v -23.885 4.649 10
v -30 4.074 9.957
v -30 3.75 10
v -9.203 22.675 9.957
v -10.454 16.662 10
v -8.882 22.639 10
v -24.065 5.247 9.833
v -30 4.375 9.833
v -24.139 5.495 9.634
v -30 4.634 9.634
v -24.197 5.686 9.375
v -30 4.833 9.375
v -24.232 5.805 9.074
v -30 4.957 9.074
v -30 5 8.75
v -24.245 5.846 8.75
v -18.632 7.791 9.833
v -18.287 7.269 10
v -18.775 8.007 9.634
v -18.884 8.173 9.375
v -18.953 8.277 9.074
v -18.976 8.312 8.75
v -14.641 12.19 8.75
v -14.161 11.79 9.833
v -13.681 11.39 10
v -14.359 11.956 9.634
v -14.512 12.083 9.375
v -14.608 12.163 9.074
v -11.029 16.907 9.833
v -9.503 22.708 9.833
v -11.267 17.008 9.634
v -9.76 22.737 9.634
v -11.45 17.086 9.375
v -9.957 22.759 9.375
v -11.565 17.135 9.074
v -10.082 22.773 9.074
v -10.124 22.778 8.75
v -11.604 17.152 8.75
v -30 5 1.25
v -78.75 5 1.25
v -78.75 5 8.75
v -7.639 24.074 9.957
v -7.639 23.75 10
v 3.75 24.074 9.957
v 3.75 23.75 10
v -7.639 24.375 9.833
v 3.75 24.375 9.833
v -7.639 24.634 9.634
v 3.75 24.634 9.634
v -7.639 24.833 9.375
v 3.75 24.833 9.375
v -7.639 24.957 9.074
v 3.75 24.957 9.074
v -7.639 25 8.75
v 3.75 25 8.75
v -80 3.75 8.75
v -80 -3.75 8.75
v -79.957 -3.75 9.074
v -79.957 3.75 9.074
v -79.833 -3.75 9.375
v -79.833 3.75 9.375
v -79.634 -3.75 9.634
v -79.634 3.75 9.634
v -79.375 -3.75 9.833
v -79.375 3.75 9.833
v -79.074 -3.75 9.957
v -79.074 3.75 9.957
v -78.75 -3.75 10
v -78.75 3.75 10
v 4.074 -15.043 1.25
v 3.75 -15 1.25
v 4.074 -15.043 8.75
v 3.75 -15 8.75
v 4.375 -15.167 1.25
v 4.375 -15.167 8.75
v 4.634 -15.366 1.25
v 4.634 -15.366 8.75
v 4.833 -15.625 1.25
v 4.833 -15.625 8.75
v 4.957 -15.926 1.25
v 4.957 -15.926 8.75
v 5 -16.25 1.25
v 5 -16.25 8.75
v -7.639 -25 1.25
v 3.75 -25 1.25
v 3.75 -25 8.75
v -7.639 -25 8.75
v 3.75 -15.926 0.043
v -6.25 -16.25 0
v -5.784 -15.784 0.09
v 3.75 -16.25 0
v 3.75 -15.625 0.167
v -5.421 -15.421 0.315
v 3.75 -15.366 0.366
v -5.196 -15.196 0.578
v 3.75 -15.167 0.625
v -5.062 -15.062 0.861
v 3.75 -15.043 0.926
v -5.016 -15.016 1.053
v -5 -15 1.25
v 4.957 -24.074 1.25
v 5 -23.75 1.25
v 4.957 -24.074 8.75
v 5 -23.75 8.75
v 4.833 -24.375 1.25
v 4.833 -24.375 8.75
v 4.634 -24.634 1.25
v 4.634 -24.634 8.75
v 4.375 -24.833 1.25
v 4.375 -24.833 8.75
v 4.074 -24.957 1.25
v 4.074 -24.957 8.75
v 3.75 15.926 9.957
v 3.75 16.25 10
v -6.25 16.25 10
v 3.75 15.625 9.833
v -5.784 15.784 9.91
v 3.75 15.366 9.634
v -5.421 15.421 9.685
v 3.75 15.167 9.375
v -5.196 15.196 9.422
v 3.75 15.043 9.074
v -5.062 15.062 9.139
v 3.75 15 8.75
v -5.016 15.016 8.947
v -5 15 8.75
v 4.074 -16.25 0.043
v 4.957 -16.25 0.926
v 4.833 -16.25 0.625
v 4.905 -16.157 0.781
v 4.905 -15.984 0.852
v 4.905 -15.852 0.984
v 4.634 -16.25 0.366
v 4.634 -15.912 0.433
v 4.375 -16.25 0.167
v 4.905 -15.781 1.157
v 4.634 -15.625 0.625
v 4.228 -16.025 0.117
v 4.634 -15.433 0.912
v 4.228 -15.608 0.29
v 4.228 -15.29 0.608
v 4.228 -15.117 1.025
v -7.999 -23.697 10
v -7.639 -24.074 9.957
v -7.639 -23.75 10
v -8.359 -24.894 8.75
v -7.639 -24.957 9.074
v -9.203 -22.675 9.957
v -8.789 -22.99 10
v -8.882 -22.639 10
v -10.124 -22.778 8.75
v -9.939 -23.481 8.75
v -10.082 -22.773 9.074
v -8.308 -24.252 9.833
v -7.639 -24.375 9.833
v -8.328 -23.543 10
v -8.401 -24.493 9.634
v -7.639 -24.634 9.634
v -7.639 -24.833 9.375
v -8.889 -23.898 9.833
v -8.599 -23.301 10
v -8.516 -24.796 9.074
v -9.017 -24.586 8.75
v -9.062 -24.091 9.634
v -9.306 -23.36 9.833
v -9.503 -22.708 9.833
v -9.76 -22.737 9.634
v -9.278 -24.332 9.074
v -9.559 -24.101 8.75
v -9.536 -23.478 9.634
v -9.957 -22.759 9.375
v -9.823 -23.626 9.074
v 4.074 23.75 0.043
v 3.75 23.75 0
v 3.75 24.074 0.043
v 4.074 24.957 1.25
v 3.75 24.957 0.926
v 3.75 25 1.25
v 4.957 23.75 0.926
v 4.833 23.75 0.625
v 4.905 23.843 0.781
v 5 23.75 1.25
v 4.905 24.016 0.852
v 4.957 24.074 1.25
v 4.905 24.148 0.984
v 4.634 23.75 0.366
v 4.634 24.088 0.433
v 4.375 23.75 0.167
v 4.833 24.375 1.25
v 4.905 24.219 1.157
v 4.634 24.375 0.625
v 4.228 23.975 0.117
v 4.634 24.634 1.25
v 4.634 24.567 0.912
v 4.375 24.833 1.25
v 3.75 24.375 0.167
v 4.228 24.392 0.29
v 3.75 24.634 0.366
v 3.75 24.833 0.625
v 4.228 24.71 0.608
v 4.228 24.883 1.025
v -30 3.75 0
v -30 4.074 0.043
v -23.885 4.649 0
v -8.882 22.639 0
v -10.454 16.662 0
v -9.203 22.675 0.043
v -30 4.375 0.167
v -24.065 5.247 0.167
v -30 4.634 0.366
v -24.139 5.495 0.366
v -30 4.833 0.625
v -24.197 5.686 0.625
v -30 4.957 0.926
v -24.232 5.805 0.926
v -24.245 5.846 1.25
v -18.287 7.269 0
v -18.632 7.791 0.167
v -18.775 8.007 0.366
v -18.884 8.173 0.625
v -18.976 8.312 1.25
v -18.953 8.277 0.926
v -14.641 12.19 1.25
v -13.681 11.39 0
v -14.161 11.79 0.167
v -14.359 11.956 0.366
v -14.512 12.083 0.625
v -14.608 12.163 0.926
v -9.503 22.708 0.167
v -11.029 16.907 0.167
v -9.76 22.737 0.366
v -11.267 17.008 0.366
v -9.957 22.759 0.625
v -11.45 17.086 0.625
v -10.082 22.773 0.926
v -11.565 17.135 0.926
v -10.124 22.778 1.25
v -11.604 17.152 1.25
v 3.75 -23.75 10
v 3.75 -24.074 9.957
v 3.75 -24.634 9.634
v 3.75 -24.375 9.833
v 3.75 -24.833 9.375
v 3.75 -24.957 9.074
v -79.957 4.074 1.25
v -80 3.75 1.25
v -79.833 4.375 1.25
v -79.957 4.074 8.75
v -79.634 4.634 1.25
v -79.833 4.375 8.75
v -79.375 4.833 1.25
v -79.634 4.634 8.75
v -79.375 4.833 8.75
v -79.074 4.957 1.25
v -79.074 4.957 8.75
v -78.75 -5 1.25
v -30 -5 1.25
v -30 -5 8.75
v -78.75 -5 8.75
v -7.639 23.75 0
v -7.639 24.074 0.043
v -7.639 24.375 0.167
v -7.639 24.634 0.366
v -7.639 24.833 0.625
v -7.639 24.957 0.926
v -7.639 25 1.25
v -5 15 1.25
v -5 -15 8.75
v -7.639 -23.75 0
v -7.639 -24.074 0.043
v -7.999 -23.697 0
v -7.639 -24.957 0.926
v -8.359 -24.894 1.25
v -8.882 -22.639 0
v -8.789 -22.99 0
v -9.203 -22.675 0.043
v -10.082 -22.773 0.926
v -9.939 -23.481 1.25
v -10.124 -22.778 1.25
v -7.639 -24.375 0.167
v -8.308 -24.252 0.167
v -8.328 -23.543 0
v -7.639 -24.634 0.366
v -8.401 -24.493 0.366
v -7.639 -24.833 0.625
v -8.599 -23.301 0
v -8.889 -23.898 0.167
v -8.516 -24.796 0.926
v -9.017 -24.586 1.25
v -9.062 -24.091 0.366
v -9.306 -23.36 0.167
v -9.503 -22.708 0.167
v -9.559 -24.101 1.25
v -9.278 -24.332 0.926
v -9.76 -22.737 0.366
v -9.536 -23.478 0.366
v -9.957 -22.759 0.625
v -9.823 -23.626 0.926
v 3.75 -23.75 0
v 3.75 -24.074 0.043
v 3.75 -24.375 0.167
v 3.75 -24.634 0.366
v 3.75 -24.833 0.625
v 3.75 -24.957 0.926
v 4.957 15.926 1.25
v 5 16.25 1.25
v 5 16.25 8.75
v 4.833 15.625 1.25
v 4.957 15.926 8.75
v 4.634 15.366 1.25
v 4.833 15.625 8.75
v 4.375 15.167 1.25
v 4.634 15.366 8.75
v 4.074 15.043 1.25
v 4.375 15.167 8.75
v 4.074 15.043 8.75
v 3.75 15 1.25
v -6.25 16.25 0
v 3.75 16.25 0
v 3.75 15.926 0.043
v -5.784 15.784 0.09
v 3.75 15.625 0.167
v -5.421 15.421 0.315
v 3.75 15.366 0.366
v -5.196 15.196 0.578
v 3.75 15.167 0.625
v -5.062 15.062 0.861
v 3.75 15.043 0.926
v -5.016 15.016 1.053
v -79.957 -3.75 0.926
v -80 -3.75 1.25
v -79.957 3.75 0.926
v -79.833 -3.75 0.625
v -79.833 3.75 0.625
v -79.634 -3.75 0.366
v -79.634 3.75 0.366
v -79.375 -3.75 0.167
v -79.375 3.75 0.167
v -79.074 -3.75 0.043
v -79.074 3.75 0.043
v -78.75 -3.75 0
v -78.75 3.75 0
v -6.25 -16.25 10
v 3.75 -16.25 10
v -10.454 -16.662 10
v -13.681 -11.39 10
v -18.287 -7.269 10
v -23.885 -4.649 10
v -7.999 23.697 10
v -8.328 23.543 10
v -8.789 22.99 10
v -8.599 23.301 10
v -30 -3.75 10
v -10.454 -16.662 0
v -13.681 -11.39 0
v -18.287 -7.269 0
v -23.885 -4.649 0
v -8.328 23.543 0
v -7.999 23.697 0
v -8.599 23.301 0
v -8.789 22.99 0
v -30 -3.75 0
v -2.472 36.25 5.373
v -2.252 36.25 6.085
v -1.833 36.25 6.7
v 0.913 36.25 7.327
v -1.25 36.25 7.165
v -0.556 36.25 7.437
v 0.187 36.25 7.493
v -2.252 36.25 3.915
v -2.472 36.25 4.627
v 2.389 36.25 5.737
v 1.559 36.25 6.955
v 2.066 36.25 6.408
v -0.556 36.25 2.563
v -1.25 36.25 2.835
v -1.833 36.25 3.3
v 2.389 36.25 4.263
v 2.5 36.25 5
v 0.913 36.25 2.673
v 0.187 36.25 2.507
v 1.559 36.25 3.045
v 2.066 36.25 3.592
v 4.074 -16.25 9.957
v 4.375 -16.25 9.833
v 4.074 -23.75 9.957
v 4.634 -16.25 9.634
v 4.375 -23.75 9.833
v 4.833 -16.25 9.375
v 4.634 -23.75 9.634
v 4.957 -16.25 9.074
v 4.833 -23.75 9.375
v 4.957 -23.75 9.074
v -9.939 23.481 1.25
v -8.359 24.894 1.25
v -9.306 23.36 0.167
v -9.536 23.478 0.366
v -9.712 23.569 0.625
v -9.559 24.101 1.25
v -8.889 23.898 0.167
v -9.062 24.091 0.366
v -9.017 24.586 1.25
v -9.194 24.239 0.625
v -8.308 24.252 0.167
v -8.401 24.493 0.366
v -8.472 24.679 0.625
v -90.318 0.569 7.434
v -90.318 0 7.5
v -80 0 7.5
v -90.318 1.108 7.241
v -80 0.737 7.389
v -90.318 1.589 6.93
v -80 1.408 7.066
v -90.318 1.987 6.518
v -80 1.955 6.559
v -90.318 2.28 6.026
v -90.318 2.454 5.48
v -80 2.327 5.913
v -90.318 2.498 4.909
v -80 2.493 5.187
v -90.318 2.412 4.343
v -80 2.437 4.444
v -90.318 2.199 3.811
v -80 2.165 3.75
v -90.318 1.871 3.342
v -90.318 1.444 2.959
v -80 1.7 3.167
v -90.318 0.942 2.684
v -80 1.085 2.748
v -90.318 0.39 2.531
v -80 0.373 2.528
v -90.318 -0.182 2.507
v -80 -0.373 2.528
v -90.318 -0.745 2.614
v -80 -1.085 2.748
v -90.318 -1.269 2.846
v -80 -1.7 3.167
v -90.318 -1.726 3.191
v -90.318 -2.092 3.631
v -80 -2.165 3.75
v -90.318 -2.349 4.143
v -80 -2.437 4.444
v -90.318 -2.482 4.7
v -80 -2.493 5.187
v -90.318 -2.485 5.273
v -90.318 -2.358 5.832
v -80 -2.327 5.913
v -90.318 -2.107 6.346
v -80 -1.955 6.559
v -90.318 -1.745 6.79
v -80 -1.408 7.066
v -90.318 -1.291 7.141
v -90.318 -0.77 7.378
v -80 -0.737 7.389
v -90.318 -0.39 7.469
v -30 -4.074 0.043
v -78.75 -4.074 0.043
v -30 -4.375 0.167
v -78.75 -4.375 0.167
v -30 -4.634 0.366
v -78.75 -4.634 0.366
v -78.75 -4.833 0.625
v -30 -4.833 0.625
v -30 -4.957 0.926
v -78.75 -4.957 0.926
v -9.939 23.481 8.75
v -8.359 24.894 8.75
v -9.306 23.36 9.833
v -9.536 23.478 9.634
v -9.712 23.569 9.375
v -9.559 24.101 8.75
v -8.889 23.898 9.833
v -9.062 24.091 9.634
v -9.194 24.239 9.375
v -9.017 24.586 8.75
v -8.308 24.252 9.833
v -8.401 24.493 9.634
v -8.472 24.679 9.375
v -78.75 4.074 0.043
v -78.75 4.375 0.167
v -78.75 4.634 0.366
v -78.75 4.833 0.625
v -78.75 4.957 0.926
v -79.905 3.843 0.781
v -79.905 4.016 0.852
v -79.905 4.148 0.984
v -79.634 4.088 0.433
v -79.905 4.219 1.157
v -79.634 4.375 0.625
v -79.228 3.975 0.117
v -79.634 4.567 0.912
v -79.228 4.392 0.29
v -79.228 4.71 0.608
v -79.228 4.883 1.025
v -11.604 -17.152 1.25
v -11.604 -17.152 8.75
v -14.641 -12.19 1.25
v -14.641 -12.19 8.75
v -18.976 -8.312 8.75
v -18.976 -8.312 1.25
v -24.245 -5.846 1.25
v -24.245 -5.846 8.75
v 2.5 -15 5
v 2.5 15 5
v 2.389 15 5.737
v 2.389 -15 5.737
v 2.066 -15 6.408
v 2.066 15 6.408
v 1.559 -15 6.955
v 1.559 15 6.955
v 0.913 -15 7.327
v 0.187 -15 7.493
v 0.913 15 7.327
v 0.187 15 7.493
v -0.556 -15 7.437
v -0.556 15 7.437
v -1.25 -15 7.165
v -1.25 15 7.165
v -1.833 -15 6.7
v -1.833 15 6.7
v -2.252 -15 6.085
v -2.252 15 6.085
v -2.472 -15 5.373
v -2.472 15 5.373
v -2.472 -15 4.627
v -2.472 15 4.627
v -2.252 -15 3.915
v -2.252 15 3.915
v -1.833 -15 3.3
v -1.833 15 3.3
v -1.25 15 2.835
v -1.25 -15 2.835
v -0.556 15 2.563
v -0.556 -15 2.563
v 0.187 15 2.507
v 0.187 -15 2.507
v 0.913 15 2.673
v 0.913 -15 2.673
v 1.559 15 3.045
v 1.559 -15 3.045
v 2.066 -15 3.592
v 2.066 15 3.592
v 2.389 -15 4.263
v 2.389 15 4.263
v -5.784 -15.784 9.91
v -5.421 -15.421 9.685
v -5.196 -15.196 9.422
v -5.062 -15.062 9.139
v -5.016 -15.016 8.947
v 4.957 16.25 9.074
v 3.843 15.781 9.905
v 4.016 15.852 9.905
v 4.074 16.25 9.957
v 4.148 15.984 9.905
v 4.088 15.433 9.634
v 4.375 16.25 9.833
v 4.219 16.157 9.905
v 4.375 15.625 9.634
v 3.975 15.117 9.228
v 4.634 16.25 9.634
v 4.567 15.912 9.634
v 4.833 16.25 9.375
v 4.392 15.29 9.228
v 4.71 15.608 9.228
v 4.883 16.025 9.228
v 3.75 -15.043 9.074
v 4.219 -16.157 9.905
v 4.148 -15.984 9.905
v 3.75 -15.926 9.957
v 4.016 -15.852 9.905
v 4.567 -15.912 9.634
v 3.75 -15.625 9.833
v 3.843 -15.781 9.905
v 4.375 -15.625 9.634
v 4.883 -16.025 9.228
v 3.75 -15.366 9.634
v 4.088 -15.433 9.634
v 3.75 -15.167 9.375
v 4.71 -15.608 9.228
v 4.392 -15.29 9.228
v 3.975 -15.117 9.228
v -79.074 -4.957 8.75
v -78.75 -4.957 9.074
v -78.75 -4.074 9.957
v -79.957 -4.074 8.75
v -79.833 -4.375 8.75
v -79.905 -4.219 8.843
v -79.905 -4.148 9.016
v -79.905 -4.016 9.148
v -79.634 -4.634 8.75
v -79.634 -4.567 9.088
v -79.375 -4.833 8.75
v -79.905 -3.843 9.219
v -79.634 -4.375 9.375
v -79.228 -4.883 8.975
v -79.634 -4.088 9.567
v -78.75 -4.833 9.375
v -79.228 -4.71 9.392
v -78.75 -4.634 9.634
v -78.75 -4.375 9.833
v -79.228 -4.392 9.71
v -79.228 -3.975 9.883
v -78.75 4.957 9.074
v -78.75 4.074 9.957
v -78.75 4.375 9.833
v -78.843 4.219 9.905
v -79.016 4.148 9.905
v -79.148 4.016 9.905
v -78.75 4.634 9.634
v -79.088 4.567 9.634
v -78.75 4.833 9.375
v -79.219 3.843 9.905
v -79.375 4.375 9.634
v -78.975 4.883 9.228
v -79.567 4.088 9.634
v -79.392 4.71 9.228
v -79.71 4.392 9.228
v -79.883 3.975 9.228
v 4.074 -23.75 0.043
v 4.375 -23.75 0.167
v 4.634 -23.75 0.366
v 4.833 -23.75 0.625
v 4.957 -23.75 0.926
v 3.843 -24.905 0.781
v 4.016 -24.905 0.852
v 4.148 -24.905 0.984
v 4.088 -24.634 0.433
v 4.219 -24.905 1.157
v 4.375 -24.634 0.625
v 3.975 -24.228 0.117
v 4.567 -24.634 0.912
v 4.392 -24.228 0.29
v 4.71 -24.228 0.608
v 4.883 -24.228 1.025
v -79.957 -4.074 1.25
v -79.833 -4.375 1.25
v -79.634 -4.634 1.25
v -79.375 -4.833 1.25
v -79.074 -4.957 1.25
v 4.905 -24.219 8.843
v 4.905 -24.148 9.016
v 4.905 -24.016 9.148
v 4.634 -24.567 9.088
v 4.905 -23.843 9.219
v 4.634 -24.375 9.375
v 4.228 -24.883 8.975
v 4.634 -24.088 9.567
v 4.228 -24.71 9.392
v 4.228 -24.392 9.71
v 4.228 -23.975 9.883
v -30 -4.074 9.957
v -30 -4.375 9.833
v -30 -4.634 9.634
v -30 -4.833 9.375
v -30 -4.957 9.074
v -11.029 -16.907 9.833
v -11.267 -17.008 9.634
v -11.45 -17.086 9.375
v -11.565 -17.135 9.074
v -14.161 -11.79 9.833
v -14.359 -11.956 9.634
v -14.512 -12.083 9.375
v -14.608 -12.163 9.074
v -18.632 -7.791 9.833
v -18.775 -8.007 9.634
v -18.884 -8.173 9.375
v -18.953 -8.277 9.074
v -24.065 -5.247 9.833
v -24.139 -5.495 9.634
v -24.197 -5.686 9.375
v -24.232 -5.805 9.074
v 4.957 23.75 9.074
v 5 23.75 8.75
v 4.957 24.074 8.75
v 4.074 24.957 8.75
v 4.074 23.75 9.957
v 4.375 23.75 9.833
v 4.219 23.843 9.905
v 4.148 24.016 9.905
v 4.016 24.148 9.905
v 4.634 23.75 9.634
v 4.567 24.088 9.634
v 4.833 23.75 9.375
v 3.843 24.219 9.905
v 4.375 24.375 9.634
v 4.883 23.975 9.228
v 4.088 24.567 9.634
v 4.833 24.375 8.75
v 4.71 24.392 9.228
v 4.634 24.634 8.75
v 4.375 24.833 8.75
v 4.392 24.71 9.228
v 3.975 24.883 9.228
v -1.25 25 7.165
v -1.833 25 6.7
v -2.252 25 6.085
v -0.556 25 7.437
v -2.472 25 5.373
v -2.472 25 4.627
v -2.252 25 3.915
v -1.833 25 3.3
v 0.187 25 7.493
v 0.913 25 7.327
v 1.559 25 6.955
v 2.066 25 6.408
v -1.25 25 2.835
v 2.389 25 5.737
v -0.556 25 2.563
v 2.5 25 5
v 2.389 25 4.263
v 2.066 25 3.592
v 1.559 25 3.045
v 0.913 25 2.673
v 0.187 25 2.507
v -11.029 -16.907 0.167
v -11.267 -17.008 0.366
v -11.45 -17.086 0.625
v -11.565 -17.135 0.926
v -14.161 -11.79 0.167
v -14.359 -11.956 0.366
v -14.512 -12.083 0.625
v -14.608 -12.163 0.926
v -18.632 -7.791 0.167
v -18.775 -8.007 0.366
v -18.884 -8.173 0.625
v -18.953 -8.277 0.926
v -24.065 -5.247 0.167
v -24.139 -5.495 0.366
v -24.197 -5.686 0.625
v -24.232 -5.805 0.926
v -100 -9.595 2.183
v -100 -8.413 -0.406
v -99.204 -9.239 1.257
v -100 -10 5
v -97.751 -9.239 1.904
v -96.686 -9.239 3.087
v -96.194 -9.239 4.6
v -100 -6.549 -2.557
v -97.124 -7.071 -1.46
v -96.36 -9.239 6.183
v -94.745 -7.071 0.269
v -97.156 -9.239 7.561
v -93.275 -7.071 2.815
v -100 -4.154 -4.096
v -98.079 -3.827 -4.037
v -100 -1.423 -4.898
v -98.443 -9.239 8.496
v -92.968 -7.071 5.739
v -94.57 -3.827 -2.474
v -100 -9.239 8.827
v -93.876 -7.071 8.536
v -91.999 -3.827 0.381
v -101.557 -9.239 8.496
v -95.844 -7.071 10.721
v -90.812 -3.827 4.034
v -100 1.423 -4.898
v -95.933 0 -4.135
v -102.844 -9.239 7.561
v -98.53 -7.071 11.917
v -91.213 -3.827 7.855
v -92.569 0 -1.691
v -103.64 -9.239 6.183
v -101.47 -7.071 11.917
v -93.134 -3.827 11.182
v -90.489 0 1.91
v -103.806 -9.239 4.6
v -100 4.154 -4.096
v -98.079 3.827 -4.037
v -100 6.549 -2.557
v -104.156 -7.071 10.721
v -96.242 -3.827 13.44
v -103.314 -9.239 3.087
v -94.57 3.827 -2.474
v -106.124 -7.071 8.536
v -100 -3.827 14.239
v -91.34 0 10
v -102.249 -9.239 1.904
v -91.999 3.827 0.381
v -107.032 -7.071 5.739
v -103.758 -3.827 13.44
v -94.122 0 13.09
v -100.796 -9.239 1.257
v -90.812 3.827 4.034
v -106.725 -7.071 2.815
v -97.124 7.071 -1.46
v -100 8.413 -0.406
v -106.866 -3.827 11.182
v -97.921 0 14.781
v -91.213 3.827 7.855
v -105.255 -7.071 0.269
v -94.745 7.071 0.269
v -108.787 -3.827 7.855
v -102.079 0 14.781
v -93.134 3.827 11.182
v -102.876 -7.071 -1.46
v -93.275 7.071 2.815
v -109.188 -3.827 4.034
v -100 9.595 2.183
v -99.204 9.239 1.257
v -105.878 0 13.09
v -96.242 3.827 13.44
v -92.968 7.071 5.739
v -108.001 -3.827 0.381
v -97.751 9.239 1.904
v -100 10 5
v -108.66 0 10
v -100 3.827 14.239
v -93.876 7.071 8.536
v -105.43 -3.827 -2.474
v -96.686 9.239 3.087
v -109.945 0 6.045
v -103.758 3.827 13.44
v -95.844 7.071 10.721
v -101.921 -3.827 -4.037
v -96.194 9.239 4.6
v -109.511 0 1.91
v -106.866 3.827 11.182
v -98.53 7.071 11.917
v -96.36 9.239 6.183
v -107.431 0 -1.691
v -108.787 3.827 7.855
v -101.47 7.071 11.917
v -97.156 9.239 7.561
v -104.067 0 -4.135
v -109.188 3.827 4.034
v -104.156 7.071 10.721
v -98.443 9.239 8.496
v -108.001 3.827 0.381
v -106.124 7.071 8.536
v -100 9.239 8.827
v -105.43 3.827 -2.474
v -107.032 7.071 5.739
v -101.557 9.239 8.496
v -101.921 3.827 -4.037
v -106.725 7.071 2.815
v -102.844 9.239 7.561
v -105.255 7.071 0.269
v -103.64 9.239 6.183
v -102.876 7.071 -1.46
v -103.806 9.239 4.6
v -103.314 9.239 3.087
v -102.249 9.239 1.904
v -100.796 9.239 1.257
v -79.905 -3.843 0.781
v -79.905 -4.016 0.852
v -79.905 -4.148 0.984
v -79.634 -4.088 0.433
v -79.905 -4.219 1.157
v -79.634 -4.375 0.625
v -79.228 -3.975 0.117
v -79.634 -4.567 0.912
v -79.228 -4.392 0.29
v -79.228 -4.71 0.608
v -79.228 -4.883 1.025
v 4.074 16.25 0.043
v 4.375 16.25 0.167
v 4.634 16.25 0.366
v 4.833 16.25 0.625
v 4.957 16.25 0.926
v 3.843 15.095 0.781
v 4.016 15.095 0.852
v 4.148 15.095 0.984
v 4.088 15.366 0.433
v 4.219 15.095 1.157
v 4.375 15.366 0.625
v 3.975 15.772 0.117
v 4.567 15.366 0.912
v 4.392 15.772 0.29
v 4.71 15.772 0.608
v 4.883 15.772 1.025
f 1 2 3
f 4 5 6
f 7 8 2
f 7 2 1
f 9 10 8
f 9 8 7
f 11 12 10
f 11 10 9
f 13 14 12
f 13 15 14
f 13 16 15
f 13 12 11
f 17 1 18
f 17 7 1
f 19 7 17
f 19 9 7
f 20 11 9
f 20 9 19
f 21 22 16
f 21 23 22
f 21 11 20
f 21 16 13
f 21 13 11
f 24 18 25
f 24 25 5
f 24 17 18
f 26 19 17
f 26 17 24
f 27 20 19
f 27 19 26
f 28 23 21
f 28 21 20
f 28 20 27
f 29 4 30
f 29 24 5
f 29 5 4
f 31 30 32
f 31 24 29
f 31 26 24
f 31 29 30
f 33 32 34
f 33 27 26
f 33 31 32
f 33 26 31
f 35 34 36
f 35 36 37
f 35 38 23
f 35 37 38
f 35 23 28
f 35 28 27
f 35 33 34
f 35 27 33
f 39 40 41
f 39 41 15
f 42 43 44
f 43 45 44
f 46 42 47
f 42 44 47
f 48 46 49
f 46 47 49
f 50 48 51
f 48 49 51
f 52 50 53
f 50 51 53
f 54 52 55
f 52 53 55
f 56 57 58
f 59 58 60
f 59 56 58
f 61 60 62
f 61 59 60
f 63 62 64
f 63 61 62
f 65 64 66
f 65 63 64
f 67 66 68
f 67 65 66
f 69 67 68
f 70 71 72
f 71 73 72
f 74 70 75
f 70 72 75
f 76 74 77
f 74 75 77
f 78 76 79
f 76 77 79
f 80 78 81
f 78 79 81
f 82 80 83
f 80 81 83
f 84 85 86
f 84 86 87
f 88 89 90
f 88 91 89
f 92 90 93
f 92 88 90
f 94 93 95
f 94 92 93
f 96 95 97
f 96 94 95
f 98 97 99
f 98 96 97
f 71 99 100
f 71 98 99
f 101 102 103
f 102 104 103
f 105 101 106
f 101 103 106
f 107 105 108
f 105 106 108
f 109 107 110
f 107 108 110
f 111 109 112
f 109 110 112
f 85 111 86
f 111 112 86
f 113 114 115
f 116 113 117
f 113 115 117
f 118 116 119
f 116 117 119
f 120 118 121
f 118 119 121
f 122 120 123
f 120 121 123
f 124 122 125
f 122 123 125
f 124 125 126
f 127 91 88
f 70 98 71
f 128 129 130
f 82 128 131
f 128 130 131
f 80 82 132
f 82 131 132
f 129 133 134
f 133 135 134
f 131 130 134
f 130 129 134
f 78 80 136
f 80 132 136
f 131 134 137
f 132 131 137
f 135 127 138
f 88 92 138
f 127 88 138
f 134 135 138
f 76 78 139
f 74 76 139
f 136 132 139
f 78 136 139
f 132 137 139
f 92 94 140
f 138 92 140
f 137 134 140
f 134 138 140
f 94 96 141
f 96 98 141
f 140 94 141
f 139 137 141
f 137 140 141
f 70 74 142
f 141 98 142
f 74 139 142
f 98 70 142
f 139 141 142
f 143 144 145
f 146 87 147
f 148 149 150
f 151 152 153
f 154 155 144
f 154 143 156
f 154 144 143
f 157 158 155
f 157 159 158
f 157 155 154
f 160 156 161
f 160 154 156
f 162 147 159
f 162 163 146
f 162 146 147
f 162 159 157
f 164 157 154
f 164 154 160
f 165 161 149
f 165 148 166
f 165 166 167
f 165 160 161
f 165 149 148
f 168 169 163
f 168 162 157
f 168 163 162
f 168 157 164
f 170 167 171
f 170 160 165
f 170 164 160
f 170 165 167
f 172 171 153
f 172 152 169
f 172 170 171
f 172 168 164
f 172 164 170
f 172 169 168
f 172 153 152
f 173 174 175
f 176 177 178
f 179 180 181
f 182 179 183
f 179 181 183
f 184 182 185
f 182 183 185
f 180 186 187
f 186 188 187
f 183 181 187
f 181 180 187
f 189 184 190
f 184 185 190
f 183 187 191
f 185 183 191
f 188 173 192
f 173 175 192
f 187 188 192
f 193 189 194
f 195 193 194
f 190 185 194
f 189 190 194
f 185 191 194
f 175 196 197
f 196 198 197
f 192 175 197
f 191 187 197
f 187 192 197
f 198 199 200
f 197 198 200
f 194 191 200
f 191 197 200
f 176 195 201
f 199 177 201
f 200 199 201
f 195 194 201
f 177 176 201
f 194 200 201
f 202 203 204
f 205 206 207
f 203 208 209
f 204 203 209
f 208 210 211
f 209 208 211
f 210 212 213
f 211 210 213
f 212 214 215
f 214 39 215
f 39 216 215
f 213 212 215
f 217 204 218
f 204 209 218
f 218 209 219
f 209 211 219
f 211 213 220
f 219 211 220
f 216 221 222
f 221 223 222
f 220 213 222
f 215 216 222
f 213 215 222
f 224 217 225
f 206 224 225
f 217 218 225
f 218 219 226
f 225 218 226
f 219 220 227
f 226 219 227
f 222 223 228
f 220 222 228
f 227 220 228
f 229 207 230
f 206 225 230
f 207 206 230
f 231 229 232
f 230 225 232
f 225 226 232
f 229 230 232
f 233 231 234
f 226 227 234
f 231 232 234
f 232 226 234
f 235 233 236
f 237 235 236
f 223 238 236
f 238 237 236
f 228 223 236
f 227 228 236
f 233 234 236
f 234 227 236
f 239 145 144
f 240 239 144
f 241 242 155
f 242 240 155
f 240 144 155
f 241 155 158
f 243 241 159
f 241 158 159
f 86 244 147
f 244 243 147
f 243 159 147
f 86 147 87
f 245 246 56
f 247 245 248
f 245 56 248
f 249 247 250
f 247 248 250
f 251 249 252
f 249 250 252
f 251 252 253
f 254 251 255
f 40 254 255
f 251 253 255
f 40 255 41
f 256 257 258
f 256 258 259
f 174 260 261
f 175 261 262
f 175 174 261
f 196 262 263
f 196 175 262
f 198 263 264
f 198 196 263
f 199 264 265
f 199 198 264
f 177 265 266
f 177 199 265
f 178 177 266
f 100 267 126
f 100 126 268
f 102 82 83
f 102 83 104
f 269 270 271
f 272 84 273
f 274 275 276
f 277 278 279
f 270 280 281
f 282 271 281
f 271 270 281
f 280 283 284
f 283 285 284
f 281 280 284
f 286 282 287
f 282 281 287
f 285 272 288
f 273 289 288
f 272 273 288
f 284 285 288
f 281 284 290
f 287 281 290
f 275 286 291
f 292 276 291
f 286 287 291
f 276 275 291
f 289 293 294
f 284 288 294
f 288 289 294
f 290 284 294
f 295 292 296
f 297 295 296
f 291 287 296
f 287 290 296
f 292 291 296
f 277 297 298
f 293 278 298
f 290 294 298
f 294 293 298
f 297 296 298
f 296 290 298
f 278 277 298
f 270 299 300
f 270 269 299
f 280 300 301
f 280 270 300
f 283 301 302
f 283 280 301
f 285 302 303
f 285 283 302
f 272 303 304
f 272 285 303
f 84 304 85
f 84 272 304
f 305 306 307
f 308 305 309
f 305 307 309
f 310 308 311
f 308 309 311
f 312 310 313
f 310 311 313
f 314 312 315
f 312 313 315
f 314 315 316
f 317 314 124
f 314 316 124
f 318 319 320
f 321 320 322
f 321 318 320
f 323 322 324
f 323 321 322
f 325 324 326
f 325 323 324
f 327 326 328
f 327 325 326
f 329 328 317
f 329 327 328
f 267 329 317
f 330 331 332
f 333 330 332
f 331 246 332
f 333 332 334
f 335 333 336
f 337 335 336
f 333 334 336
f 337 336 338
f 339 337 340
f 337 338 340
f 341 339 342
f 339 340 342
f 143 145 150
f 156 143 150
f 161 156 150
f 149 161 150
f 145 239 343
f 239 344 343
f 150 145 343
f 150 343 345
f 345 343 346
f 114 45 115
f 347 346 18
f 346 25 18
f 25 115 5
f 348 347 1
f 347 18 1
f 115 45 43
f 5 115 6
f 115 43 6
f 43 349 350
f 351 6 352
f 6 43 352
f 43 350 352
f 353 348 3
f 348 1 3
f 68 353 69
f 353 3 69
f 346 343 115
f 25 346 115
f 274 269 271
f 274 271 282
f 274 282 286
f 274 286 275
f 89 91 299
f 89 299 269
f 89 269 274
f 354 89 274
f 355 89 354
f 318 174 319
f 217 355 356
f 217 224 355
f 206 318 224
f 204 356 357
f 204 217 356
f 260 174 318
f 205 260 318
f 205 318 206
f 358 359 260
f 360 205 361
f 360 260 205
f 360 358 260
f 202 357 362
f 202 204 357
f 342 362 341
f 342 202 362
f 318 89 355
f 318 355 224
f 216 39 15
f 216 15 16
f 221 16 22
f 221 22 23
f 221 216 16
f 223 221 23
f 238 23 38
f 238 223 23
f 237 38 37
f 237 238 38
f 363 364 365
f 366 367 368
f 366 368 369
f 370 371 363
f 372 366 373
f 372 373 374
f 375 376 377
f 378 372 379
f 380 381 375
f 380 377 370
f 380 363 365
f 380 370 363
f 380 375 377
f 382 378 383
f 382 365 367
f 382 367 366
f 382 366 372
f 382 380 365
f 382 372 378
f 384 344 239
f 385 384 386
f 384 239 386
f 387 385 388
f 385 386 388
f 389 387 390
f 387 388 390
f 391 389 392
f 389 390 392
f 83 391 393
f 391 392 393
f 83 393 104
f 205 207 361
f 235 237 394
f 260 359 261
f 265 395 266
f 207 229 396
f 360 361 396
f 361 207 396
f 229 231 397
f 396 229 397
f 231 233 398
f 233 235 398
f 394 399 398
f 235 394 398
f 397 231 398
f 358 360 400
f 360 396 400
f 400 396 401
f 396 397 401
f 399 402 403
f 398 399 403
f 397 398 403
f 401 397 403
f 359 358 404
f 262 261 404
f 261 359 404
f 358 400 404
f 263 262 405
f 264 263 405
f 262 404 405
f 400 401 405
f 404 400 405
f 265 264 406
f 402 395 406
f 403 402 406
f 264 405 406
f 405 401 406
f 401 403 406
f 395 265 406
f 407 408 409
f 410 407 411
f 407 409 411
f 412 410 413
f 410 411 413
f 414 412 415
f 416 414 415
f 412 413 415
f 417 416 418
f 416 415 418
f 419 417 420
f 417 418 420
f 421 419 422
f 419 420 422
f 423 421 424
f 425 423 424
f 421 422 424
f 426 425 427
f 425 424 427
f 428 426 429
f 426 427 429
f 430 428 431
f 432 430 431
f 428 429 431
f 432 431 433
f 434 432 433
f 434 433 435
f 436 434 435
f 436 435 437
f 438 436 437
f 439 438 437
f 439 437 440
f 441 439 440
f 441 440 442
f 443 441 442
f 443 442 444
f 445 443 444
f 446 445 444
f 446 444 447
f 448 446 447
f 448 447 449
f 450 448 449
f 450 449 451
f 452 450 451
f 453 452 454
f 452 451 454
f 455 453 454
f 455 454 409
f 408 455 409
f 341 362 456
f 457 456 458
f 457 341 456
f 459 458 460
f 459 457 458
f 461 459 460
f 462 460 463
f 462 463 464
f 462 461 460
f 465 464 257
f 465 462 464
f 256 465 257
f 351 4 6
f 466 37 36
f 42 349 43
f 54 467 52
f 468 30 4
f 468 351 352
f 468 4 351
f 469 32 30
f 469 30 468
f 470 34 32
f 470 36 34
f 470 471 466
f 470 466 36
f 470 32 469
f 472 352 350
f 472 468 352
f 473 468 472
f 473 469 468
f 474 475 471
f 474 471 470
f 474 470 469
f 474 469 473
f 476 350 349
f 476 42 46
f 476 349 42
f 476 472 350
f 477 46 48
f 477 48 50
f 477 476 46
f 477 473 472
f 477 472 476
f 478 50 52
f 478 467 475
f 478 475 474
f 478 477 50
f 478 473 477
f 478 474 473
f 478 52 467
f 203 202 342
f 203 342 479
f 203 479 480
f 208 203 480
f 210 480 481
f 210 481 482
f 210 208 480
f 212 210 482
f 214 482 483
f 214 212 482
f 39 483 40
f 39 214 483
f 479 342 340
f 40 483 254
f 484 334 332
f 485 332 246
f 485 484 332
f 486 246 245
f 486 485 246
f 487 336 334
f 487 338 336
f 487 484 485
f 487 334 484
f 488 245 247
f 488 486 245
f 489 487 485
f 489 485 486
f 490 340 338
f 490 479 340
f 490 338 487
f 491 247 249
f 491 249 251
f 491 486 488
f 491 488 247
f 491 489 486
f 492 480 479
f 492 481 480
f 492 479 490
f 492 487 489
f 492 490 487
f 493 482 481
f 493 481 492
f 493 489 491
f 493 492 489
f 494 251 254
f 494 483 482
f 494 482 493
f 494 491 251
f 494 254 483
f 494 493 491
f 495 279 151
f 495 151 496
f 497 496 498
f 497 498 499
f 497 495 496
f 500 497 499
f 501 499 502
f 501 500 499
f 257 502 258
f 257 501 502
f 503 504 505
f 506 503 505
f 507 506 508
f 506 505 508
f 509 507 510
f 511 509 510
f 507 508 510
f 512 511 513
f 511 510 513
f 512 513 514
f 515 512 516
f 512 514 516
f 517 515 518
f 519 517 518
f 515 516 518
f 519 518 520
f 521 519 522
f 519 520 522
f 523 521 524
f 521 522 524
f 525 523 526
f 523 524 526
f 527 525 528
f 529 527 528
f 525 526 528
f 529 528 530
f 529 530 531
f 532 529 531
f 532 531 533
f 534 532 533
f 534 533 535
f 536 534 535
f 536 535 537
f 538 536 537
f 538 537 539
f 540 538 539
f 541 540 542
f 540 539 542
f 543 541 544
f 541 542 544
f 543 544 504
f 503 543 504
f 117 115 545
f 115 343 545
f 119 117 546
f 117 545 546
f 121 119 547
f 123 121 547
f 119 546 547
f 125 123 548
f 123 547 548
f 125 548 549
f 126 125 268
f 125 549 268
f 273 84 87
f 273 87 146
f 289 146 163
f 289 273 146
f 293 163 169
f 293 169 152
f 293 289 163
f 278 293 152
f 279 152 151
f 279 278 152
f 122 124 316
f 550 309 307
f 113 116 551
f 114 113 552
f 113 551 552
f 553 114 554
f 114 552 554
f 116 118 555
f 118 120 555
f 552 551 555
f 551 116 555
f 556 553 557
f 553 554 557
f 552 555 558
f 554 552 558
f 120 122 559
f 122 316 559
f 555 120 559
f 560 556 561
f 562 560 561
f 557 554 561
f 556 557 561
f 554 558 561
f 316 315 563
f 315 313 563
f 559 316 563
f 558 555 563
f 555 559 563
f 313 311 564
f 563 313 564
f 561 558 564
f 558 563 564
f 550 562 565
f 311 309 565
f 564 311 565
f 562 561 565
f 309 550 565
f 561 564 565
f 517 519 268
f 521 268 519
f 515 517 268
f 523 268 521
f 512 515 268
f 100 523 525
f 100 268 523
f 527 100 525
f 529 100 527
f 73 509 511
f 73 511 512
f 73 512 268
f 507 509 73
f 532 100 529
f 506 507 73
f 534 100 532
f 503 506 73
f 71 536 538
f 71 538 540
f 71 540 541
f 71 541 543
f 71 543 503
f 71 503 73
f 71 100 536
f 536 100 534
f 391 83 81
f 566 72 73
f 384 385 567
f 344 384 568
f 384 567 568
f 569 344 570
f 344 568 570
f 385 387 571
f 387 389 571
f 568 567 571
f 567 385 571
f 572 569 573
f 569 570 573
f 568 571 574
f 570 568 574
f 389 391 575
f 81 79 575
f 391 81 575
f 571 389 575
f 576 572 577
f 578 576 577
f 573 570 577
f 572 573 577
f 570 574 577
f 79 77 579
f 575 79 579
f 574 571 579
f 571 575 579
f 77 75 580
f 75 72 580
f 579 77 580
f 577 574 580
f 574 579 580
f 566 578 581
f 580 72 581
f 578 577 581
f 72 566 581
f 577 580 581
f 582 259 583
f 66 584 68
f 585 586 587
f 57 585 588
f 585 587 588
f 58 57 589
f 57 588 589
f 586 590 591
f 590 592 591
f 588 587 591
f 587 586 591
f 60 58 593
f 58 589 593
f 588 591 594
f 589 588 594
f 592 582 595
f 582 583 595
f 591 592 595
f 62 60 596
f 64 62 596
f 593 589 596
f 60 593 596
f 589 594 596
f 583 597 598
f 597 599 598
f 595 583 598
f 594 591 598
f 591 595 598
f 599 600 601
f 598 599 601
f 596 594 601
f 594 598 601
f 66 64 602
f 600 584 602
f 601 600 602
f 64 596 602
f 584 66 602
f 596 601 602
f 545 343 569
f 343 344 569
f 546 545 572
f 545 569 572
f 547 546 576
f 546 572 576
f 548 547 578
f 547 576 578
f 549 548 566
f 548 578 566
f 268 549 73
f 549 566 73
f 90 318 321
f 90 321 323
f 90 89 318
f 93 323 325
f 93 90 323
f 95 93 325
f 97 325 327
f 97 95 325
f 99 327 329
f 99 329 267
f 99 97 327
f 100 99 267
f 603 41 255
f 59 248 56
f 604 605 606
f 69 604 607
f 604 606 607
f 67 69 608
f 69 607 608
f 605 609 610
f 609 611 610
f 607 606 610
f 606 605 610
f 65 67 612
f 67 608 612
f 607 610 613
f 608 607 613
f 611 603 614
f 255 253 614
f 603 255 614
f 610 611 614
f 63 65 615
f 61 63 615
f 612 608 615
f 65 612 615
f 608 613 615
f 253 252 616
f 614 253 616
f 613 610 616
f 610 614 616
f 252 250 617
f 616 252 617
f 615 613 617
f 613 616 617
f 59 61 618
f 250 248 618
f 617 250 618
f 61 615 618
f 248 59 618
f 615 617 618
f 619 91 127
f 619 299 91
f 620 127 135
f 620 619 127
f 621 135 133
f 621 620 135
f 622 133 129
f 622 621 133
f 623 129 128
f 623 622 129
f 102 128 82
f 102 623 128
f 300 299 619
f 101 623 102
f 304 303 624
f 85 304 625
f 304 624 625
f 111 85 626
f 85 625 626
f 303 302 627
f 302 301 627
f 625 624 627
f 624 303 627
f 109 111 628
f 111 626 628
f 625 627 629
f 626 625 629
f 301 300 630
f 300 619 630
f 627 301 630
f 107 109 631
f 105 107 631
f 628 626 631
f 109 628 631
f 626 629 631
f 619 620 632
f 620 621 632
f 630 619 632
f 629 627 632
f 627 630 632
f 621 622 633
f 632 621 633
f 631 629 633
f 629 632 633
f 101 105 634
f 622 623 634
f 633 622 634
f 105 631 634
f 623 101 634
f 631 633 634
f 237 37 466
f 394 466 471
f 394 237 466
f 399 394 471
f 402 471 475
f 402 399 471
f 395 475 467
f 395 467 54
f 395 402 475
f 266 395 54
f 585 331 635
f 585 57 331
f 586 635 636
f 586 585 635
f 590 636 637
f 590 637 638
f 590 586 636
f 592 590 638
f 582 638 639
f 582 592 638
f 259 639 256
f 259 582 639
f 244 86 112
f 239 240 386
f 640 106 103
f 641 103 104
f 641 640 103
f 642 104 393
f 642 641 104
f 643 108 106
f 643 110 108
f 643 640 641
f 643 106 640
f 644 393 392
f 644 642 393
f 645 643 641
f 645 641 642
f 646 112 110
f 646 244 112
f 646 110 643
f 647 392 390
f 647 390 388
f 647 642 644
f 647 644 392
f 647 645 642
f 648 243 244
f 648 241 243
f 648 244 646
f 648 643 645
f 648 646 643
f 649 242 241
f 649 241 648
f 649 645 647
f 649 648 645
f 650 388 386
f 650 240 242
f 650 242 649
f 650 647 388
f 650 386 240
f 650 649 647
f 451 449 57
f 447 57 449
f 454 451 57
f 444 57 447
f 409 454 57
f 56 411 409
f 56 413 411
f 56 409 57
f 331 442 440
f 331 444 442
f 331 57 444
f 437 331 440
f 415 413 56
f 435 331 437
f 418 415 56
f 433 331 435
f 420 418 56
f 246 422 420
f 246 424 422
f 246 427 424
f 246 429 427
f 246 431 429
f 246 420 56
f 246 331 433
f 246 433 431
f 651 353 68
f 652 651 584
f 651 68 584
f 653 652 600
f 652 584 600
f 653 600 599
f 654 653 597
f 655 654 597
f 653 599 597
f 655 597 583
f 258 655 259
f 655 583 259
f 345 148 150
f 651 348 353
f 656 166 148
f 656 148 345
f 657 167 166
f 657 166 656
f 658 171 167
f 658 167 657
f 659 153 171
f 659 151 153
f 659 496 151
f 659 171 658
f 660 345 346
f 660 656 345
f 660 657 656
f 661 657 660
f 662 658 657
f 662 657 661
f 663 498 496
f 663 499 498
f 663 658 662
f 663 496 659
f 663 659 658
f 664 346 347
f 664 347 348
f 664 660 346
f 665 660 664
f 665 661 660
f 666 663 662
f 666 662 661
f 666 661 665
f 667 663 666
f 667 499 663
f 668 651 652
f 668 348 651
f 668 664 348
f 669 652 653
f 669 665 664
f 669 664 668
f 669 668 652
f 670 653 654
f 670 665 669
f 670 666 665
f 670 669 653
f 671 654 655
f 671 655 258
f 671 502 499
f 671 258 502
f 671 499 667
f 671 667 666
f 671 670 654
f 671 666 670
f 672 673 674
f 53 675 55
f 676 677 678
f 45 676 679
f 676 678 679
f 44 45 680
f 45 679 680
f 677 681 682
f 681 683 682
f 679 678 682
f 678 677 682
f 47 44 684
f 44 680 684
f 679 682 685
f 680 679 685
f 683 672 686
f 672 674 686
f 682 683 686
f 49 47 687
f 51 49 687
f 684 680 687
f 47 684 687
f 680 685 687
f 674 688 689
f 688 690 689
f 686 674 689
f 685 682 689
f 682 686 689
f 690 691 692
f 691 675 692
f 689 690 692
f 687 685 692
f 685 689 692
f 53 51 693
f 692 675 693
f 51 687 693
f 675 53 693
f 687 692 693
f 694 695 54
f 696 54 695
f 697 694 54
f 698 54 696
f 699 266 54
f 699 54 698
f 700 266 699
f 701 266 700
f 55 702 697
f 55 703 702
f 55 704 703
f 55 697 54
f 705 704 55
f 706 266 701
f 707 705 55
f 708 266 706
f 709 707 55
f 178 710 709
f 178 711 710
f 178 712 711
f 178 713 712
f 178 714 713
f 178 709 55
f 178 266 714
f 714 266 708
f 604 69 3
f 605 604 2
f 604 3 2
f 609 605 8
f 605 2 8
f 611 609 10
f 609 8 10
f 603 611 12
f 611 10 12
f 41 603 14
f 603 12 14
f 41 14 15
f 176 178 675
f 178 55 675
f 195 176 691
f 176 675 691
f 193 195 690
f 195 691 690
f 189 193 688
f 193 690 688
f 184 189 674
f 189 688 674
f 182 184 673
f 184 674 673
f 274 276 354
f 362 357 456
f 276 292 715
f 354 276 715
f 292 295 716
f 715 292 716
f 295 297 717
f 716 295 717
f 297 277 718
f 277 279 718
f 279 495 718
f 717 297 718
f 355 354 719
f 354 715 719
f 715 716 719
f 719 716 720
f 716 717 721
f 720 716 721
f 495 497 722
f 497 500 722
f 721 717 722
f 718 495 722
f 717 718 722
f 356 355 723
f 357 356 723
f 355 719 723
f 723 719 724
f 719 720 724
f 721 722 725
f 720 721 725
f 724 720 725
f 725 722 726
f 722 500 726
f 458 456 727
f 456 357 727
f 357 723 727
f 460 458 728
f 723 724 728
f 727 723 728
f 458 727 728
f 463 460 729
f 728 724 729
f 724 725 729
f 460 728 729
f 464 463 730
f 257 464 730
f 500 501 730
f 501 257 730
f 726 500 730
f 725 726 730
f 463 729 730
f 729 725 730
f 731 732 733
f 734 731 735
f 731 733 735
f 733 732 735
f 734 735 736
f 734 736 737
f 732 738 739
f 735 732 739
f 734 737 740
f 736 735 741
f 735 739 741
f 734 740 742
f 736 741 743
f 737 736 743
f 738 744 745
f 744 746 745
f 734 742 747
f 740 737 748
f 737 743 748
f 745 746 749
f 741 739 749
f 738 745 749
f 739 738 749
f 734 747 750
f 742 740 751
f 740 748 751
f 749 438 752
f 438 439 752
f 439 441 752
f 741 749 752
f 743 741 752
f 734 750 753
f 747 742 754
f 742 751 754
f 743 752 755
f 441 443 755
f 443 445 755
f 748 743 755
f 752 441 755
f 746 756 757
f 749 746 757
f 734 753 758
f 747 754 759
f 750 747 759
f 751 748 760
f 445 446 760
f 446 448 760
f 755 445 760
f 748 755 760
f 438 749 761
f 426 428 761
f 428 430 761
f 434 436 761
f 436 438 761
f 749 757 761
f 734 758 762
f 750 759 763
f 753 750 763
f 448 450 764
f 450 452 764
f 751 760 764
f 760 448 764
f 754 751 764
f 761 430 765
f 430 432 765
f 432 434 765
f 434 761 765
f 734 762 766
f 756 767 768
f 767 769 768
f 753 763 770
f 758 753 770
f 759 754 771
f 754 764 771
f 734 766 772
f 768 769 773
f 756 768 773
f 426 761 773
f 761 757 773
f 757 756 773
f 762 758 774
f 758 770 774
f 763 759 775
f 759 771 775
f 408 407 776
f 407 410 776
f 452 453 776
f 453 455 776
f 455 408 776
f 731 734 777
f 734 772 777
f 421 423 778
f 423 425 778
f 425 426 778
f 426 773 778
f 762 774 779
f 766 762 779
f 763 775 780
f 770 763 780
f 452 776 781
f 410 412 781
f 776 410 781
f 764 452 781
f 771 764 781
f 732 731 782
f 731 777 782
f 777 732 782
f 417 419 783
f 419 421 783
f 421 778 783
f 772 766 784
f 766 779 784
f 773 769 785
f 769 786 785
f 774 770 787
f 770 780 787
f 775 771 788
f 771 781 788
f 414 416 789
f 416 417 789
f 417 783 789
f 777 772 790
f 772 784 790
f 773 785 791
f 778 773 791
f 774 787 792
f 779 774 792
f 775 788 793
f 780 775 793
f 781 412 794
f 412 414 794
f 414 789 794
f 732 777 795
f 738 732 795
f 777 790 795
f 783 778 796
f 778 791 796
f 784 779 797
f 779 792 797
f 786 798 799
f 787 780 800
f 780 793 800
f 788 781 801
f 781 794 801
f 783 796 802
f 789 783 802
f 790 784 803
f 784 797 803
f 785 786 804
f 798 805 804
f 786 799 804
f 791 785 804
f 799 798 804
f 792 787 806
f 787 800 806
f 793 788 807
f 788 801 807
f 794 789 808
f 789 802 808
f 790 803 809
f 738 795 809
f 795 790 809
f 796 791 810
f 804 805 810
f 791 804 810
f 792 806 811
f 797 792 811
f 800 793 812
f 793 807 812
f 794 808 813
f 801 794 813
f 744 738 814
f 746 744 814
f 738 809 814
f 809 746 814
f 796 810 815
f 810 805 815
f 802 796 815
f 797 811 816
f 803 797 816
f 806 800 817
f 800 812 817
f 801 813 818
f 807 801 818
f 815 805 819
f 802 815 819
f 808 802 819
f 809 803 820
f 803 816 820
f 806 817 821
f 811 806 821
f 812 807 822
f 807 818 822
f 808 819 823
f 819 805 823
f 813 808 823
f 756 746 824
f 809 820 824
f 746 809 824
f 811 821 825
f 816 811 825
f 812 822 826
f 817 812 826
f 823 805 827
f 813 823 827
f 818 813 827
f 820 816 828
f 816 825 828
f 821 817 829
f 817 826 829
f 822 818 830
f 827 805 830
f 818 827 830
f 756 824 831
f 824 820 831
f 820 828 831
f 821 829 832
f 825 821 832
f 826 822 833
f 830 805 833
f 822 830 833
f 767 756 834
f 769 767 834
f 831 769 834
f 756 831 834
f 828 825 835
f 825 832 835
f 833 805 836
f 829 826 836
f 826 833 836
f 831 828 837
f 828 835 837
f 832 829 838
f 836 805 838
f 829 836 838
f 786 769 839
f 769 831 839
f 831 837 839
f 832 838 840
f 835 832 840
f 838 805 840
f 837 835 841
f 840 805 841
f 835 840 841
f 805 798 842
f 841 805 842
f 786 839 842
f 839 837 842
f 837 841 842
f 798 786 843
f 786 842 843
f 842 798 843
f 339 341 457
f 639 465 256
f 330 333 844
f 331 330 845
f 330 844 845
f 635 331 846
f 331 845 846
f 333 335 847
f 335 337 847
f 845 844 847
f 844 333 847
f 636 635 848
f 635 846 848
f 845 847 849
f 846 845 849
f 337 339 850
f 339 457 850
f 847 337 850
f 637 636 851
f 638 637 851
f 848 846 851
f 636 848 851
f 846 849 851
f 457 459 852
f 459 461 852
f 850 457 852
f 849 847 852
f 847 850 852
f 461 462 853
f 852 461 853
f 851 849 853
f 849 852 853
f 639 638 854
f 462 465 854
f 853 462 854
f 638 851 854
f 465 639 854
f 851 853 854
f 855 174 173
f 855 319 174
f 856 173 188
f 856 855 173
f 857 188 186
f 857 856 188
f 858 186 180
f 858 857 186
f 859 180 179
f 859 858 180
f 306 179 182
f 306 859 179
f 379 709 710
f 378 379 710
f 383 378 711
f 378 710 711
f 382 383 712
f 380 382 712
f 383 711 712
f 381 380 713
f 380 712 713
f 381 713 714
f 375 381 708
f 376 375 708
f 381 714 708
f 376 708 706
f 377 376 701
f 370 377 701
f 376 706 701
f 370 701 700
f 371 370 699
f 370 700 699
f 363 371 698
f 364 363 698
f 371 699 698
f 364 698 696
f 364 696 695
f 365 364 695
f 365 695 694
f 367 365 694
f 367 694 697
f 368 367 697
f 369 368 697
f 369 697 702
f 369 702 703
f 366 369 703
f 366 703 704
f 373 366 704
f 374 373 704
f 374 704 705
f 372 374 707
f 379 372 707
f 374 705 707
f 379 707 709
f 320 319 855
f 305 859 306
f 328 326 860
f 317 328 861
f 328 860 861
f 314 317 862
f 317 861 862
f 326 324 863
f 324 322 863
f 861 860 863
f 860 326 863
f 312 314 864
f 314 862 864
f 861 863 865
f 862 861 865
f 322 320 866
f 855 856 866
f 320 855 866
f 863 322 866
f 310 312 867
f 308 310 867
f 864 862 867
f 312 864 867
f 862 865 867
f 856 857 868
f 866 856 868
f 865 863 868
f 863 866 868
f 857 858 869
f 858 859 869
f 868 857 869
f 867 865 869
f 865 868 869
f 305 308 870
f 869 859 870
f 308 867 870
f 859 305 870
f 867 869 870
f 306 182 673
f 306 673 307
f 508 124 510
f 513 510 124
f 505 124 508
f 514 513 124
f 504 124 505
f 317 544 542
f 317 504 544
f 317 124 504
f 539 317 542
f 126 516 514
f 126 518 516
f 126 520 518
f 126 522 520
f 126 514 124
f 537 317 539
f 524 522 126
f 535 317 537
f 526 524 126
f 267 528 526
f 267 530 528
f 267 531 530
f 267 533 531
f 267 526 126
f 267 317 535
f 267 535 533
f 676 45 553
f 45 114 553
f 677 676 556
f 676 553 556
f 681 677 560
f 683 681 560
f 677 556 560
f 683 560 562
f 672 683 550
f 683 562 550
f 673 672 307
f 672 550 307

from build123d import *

# Parameters (mm, degrees)
BOSS_EXTRUDE2_DEPTH = 10
SKETCH2_R           = 2.5
BOSS_EXTRUDE3_DEPTH = 20
SKETCH5_R           = 2.5
BOSS_EXTRUDE4_DEPTH = 30
SKETCH6_R           = 2.5
BOSS_EXTRUDE5_DEPTH = 11.25
FILLET1_R           = 1.25


with BuildPart() as part:
    # Sketch1 → Boss-Extrude2 (new body)
    with BuildSketch(Plane.XY):
        with BuildLine():
            Line((-80, 5), (-30, 5))
            ThreePointArc((-30, 5), (-16.666666667, 10.09288015), (-10.1238402, 22.777777778))
            ThreePointArc((-10.1238402, 22.777777778), (-9.305986892, 24.363389981), (-7.639320225, 25))
            Line((-7.639320225, 25), (5, 25))
            Line((5, 25), (5, 15))
            Line((5, 15), (-5, 15))
            Line((-5, 15), (-5, -15))
            Line((-5, -15), (5, -15))
            Line((5, -15), (5, -25))
            Line((5, -25), (-7.639320225, -25))
            ThreePointArc((-7.639320225, -25), (-9.305986892, -24.363389981), (-10.1238402, -22.777777778))
            ThreePointArc((-10.1238402, -22.777777778), (-16.666666667, -10.09288015), (-30, -5))
            Line((-30, -5), (-80, -5))
            Line((-80, -5), (-80, 5))
        make_face()
    extrude(amount=BOSS_EXTRUDE2_DEPTH)

    # Sketch2 → Boss-Extrude3 (add)
    with BuildSketch(Plane.ZY.offset(80)):
        with Locations((5, 0)):
            Circle(SKETCH2_R)
    extrude(amount=BOSS_EXTRUDE3_DEPTH)

    # Sketch3 → Revolve1 (revolve)
    with BuildSketch(Plane.ZY.offset(100)):
        with BuildLine():
            Line((5, 10), (5, -10))
            ThreePointArc((5, -10), (-5, 0), (5, 10))
        make_face()
    revolve(axis=Axis((-100, 10, 5), (0, -1, 0)))

    # Sketch5 → Boss-Extrude4 (add)
    with BuildSketch(Plane.XZ.offset(-15)):
        with Locations((0, 5)):
            Circle(SKETCH5_R)
    extrude(amount=BOSS_EXTRUDE4_DEPTH)

    # Sketch6 → Boss-Extrude5 (add)
    with BuildSketch(Plane(origin=(0, 25, 0), x_dir=(1, 0, 0), z_dir=(0, 1, 0))):
        with Locations((0, -5)):
            Circle(SKETCH6_R)
    extrude(amount=BOSS_EXTRUDE5_DEPTH)

    # Fillet1
    fillet1_edges = [part.edges().sort_by_distance(p)[0] for p in [
        (-16.666666667, -10.09288015, 10),
        (-55, 5, 0),
        (-16.666666667, 10.09288015, 0),
        (-9.305986892, 24.363389981, 0),
        (-1.319660113, 25, 0),
        (5, 20, 0),
        (0, 15, 0),
        (-5, 0, 0),
        (0, -15, 0),
        (-9.305986892, -24.363389981, 10),
        (5, -20, 0),
        (-1.319660113, -25, 0),
        (-9.305986892, -24.363389981, 0),
        (-16.666666667, -10.09288015, 0),
        (-55, -5, 0),
        (-80, 0, 0),
        (-1.319660113, -25, 10),
        (-80, 5, 5),
        (5, 25, 5),
        (5, 15, 5),
        (5, -15, 5),
        (5, -25, 5),
        (5, -20, 10),
        (-80, -5, 5),
        (0, -15, 10),
        (-5, 0, 10),
        (0, 15, 10),
        (5, 20, 10),
        (-1.319660113, 25, 10),
        (-9.305986892, 24.363389981, 10),
        (-80, 0, 10),
        (-16.666666667, 10.09288015, 10),
        (-55, 5, 10),
        (-55, -5, 10),
    ]]
    fillet(fillet1_edges, radius=FILLET1_R)


solid = part.part
